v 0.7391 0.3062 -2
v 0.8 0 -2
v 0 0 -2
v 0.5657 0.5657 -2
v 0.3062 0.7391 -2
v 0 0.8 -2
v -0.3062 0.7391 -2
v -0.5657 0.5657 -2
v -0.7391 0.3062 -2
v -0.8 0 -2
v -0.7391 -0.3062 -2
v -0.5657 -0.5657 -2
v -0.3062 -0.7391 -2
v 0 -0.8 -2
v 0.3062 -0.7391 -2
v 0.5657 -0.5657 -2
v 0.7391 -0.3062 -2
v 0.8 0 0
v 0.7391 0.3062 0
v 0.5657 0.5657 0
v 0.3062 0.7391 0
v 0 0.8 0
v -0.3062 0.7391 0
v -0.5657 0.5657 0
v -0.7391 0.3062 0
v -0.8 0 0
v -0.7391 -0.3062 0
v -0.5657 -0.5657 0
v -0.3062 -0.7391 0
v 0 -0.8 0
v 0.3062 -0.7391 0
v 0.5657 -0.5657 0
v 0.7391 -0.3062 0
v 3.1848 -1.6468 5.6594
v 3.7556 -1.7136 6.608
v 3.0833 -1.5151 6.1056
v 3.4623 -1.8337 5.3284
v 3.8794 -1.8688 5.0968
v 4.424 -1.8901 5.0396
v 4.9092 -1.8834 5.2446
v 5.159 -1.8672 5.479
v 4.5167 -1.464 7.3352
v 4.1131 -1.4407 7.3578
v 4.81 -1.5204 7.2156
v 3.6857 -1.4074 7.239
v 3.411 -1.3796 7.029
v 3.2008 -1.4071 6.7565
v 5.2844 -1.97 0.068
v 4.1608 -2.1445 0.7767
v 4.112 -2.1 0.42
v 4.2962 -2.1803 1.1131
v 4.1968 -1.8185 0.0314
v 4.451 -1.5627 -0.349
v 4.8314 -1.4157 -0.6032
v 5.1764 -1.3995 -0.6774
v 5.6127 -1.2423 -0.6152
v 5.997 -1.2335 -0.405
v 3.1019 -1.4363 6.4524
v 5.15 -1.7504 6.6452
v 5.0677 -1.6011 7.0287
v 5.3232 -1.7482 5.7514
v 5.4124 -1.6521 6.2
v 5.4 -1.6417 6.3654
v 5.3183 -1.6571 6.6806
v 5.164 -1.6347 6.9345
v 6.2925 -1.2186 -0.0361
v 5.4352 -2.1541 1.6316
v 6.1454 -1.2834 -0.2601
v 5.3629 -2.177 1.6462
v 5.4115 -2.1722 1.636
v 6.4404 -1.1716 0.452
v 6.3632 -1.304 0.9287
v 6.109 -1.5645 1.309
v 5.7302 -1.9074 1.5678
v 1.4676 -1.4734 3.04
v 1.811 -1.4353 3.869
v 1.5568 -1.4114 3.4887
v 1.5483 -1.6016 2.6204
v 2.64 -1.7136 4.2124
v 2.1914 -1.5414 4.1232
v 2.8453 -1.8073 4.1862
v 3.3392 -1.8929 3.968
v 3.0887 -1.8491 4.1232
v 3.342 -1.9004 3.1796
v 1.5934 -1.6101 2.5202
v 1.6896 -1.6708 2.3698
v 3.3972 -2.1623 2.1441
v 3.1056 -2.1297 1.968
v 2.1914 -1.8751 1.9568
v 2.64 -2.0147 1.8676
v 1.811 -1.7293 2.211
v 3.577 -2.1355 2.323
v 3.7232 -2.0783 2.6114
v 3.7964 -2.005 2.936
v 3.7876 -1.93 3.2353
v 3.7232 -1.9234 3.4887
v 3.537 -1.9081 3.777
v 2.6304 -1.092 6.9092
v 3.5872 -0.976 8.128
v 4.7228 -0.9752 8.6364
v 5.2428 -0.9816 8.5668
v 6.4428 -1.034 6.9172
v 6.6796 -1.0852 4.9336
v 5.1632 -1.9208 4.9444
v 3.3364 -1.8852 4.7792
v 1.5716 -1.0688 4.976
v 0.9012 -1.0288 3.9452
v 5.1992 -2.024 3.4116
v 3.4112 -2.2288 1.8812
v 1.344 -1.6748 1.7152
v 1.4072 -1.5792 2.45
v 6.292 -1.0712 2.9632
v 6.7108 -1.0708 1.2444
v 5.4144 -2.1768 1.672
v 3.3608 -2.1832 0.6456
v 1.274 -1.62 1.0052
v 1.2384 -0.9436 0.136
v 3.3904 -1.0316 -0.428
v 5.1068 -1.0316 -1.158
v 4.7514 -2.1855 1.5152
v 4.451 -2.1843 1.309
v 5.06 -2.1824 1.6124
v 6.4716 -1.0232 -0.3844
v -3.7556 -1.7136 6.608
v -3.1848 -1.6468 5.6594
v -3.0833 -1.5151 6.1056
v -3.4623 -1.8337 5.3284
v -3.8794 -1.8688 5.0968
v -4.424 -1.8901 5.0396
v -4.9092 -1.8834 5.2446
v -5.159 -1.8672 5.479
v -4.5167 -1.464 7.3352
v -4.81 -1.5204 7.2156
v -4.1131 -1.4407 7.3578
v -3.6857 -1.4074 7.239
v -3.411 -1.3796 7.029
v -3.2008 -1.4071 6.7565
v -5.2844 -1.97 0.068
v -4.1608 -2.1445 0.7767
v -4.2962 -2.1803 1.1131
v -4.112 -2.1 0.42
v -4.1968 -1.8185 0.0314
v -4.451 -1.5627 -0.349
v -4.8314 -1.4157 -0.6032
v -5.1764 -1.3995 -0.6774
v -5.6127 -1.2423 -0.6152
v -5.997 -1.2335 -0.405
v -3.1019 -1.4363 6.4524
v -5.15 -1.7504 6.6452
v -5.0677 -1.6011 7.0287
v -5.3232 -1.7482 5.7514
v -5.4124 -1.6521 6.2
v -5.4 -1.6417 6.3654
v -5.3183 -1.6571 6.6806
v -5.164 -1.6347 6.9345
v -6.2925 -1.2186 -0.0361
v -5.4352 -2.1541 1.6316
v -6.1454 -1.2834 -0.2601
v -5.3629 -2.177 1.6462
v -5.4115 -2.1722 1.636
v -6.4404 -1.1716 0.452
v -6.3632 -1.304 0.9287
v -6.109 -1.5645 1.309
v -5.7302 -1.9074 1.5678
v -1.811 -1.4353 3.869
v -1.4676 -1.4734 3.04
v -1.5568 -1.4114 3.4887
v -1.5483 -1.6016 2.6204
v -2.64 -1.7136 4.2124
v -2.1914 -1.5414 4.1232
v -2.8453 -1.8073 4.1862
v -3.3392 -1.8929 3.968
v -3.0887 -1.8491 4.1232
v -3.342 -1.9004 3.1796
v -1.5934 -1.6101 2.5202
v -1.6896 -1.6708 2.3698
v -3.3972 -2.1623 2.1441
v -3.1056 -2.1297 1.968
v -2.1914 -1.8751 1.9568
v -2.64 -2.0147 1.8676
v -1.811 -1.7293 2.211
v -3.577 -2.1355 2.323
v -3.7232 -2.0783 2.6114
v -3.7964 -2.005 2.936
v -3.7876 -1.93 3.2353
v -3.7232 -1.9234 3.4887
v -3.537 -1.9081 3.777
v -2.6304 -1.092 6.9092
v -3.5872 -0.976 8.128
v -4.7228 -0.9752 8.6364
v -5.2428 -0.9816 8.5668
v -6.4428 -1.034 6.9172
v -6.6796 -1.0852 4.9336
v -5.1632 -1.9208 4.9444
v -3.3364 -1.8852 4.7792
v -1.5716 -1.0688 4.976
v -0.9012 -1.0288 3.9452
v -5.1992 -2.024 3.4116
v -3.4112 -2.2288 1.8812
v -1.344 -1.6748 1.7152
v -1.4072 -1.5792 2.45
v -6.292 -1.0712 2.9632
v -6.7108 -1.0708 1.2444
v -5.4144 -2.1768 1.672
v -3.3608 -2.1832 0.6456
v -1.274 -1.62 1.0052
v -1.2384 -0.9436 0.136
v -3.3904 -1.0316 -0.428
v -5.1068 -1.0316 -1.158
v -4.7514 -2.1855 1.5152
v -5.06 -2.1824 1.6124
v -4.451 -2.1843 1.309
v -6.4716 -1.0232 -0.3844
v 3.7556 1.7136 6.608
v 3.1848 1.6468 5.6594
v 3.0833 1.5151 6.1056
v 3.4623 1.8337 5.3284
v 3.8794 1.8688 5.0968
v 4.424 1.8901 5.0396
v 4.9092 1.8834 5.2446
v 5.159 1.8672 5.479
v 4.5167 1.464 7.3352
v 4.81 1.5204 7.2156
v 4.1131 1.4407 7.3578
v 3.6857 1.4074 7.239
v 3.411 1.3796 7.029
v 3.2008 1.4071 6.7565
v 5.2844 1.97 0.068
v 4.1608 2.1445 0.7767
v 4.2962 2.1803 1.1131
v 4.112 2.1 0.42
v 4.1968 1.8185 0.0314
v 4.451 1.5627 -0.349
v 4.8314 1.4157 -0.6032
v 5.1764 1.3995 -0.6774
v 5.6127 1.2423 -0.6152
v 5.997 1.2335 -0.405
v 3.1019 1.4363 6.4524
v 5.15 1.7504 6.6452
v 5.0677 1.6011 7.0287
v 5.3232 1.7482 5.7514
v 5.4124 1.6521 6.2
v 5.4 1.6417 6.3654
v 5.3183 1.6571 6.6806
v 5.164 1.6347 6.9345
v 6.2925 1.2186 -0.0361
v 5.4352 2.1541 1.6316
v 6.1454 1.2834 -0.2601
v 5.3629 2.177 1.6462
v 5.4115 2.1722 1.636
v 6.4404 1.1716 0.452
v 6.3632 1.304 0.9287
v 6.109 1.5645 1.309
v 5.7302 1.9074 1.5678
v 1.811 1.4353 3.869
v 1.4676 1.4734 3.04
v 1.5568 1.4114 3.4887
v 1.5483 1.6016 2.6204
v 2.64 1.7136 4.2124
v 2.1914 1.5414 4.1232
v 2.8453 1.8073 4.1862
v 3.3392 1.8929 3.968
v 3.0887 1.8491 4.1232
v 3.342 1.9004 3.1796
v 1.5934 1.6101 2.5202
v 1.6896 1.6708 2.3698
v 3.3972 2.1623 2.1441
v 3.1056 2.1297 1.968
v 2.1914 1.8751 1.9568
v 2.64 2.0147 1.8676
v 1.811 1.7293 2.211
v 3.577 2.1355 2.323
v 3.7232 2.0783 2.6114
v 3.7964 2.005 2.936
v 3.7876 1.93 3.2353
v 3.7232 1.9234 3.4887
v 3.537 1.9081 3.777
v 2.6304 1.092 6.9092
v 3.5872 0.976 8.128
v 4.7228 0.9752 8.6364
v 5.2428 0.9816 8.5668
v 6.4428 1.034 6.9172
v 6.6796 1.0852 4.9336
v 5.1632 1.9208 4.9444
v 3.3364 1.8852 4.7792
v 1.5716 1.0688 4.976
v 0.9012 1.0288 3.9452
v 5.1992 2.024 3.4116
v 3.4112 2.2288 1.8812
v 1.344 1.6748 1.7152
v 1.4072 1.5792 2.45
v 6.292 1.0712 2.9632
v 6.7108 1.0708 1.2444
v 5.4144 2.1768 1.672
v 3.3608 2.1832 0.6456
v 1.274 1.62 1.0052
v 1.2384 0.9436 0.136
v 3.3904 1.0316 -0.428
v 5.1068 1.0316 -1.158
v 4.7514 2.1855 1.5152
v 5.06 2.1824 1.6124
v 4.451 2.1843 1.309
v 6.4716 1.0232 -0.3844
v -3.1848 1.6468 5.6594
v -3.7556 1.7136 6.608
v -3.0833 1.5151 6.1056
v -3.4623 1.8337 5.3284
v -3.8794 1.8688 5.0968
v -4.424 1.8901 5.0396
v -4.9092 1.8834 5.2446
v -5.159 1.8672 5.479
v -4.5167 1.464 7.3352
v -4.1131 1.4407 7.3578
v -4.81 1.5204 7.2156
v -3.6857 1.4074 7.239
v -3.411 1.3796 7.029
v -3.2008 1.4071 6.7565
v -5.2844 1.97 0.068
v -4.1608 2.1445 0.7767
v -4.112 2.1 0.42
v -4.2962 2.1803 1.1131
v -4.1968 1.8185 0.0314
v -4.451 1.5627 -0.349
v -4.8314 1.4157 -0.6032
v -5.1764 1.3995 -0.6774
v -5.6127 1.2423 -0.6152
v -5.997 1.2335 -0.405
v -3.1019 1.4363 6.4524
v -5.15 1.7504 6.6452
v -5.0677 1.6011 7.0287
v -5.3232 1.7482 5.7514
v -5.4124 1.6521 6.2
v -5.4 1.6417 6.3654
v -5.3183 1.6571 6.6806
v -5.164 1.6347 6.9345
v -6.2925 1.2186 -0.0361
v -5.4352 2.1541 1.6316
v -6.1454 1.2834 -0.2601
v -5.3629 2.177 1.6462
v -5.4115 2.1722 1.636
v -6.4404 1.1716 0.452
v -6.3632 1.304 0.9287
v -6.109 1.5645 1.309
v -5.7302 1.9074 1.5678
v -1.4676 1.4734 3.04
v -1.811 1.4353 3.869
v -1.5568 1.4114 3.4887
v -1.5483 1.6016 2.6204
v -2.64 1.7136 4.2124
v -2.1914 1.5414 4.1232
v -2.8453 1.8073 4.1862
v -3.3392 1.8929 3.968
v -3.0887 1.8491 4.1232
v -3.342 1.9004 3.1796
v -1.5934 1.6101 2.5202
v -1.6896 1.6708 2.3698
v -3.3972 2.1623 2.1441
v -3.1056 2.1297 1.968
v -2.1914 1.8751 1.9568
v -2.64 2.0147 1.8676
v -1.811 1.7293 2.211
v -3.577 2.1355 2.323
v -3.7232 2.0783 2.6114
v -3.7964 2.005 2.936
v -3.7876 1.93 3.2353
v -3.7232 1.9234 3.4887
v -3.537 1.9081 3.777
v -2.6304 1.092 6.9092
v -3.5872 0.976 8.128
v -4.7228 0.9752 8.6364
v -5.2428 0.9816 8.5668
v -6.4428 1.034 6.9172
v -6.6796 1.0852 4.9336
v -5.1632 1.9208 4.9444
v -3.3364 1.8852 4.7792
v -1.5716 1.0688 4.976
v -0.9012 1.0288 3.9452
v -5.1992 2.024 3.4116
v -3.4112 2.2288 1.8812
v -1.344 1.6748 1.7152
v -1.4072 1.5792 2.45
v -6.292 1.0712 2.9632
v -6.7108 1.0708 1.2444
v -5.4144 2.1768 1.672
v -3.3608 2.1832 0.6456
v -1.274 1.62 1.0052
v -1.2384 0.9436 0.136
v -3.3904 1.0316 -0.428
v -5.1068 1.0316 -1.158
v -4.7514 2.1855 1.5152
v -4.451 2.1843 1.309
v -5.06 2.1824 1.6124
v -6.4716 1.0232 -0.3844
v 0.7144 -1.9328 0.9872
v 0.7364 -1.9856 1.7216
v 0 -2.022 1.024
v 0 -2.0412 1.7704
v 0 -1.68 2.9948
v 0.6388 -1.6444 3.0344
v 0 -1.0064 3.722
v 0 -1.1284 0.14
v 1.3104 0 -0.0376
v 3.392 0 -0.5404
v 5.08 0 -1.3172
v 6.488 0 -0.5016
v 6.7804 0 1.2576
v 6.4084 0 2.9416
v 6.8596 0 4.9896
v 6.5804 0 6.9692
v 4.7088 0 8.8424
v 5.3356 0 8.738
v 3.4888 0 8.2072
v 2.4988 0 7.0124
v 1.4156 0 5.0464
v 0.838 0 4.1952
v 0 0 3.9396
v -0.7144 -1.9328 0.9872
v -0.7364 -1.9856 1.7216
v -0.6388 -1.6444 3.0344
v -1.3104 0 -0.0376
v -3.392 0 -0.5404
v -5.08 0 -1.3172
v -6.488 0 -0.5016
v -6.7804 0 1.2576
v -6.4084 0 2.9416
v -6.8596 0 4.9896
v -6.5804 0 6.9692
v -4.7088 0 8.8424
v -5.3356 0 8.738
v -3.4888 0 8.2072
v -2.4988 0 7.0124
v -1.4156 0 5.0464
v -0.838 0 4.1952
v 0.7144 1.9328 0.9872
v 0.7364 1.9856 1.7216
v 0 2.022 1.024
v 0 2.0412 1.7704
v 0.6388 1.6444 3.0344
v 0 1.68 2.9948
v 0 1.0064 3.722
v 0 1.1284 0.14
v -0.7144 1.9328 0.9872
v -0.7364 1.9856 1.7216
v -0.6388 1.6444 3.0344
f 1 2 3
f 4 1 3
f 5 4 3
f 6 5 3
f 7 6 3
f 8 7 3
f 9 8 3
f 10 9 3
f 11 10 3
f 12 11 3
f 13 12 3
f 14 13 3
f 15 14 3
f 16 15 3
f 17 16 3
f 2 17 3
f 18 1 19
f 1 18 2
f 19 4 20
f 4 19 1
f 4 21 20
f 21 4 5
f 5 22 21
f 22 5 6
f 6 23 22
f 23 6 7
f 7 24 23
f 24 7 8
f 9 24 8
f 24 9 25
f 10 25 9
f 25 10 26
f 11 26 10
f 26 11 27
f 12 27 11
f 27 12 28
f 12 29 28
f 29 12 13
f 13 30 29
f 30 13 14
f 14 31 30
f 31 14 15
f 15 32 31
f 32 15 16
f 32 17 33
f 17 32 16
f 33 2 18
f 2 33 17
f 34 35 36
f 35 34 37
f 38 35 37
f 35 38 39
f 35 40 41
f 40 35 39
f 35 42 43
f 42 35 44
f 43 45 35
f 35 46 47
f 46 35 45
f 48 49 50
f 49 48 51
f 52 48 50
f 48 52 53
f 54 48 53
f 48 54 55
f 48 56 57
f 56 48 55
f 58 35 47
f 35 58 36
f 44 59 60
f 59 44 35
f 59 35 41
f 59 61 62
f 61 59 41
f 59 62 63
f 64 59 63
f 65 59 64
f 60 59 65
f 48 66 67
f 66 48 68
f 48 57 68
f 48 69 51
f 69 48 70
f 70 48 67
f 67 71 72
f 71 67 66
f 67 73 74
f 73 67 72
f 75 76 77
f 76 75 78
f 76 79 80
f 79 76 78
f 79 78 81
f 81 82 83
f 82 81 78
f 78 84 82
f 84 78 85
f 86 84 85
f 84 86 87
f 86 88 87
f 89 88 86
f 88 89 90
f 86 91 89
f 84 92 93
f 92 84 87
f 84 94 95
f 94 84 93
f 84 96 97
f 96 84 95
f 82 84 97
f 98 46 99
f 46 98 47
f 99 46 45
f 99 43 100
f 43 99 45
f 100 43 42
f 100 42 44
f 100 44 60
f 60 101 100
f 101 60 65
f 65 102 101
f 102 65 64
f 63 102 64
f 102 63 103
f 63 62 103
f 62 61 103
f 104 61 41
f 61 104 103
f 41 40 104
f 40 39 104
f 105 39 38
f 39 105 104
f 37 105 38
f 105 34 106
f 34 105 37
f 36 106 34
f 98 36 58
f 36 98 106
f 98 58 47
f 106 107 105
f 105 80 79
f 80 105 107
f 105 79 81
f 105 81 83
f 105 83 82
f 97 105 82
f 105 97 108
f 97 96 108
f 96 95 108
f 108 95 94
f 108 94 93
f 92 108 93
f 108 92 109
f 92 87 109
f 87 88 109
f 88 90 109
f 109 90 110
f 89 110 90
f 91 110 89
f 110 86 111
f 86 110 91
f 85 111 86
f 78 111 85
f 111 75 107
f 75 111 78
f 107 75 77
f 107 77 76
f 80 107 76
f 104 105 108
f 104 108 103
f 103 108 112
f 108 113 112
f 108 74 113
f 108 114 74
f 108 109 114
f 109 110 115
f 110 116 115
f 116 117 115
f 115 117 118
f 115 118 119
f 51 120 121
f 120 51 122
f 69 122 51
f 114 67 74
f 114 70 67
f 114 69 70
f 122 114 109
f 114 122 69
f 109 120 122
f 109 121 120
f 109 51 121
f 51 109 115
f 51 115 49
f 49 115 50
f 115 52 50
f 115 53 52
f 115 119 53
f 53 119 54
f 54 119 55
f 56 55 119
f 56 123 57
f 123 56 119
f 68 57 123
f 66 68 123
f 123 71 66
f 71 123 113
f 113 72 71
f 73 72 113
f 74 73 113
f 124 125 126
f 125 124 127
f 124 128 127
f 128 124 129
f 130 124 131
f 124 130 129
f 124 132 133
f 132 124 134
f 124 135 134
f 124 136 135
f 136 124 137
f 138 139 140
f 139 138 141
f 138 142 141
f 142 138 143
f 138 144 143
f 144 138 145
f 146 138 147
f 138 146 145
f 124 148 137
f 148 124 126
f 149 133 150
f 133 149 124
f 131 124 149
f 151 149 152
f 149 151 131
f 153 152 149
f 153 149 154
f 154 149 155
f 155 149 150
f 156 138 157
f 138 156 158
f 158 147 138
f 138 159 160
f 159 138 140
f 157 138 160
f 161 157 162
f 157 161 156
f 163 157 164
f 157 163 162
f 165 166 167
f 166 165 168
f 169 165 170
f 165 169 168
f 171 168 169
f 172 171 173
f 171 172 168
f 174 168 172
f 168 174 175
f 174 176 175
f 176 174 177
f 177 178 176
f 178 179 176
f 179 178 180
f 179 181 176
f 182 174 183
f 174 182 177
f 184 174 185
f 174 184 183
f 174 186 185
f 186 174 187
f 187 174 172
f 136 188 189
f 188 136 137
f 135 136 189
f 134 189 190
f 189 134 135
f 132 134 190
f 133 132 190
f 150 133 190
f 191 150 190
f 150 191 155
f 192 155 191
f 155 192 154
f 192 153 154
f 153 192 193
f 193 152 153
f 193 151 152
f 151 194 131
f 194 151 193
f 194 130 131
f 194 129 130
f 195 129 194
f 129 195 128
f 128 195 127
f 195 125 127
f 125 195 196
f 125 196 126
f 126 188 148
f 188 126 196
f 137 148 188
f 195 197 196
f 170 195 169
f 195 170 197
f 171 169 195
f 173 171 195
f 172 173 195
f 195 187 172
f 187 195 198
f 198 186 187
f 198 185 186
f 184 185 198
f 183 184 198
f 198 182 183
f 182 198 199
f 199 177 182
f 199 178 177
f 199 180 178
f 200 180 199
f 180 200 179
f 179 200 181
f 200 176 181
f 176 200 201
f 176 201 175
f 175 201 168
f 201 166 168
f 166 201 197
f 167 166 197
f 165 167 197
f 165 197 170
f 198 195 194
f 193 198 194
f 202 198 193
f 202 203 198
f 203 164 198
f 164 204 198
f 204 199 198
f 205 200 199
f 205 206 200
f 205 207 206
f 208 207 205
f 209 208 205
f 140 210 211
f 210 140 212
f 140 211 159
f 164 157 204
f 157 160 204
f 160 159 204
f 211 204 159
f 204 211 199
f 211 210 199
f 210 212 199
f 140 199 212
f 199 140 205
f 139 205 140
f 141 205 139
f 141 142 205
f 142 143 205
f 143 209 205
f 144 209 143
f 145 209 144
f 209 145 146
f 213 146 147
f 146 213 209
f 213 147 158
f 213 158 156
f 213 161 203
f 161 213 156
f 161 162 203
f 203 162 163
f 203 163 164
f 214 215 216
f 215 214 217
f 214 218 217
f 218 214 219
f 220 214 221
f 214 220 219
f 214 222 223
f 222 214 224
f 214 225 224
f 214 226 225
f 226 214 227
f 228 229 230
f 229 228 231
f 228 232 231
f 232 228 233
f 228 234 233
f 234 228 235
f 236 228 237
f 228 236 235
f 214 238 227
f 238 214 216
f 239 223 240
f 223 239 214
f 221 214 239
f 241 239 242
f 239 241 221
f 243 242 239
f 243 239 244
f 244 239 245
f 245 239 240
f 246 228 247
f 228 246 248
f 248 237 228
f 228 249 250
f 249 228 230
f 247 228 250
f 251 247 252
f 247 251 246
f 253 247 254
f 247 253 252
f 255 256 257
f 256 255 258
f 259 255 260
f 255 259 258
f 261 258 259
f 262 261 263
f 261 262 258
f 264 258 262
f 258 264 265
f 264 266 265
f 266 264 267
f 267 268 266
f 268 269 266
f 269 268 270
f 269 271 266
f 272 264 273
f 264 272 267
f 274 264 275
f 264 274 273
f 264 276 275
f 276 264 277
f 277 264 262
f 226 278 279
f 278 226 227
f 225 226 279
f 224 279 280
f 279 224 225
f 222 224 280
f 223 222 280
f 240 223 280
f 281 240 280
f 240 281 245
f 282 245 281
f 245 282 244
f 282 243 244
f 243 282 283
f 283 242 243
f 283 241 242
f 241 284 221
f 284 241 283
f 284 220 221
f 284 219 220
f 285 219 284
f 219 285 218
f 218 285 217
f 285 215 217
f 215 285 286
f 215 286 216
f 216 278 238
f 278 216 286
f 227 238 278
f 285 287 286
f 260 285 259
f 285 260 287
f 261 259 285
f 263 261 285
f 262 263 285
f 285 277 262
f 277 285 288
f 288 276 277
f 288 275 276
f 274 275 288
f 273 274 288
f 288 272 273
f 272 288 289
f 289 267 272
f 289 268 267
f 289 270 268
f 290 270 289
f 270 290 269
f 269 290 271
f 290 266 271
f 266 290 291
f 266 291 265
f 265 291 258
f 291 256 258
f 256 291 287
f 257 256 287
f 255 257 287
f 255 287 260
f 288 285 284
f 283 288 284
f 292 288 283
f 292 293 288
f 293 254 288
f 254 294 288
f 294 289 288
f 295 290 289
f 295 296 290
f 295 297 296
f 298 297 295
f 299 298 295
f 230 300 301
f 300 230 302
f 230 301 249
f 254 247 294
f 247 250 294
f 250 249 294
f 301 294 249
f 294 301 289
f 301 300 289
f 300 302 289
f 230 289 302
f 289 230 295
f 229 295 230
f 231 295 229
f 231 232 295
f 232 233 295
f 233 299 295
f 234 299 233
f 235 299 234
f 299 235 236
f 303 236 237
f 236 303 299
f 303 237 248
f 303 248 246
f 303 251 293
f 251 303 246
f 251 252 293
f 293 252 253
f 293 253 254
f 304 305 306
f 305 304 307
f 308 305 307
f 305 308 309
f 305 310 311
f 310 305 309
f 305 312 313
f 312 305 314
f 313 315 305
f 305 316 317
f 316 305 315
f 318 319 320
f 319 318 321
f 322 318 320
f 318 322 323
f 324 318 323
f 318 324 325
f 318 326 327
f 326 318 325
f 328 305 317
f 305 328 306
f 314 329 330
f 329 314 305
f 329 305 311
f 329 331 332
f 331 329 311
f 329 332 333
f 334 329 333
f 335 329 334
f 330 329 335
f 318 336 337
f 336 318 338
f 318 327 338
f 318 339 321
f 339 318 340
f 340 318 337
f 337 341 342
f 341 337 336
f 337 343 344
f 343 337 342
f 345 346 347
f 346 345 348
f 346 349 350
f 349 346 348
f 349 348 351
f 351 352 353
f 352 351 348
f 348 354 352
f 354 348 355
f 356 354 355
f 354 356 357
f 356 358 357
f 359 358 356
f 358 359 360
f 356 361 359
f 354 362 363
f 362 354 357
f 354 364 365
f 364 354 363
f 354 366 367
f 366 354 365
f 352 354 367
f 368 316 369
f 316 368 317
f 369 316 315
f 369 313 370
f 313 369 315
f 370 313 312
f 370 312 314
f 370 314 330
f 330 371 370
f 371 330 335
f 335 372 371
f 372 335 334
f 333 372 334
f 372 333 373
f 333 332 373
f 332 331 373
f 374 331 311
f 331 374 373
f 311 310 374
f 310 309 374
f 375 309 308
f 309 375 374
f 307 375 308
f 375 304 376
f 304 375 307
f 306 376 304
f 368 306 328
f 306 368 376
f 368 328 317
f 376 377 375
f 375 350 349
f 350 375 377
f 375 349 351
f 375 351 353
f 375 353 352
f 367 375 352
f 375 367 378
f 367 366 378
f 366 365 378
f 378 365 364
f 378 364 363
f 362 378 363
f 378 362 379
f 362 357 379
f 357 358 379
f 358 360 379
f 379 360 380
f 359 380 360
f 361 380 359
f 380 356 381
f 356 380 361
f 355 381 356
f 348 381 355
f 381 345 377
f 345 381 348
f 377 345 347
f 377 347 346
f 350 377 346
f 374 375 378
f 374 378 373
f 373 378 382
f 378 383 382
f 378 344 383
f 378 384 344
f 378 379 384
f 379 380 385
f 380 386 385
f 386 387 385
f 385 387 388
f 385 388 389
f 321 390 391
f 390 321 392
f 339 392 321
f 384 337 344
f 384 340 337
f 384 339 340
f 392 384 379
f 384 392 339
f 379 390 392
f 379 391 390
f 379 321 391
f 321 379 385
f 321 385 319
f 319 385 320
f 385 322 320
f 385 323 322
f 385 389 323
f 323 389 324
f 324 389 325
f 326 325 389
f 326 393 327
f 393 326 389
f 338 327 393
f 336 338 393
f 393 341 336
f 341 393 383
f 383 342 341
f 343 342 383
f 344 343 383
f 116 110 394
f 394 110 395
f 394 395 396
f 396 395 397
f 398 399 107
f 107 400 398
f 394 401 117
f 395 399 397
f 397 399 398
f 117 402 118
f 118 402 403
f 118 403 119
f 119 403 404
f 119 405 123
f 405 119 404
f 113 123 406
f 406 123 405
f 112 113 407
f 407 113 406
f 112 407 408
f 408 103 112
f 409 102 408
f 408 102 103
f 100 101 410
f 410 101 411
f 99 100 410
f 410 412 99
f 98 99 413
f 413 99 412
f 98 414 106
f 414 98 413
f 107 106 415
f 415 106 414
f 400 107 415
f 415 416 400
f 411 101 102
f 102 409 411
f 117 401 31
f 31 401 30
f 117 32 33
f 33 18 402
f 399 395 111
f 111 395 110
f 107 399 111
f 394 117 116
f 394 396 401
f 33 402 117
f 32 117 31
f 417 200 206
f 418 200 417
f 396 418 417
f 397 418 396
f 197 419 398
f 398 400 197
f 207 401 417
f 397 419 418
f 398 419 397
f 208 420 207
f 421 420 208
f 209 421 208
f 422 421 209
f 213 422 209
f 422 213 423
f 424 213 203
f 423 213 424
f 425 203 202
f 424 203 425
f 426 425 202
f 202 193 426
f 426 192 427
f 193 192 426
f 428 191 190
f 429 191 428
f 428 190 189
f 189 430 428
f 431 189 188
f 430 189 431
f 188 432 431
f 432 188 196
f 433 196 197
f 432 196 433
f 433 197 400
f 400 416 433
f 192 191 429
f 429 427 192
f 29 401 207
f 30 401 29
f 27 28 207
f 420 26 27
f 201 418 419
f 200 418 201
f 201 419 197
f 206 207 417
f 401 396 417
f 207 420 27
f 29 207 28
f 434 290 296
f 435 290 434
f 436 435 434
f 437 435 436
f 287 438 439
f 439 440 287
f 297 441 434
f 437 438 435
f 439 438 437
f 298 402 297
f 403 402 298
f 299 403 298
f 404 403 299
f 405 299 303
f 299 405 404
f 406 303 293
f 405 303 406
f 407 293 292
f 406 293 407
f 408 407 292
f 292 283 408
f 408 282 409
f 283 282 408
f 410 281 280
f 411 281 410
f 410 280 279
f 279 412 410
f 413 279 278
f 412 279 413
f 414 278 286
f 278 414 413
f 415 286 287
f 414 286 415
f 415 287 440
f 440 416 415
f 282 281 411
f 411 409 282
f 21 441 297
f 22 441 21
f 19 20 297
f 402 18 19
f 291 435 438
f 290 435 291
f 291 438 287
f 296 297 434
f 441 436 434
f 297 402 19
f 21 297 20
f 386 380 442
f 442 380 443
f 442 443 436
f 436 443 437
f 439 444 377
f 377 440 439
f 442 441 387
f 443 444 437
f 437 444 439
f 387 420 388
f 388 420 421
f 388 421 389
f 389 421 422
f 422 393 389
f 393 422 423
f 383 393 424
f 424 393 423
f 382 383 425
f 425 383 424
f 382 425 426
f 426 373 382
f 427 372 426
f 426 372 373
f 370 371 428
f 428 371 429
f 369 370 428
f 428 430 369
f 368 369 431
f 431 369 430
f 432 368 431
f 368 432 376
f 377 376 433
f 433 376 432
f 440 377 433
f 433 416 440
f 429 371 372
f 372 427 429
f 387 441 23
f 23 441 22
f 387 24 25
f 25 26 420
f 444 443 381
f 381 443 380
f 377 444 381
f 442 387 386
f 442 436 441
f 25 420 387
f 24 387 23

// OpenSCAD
// file: ../p/4-4edge.scad
use <../lib.scad>
function ldraw_lib__4_4edge() = [
// 0 Circle 1.0
// 0 Name: 4-4edge.dat
// 0 Author: James Jessiman
// 0 !LDRAW_ORG Primitive UPDATE 2017-01
// 0 !LICENSE Licensed under CC BY 4.0 : see CAreadme.txt
// 
// 0 BFC CERTIFY CCW
  [0,"BFC","CERTIFY"],
  [0,"BFC","CCW"],
// 
// 0 !HISTORY 1998-12-15 [PTadmin] Official Update 1998-10
// 0 !HISTORY 2005-12-28 [PTadmin] Official Update 2005-01
// 0 !HISTORY 2007-06-24 [PTadmin] Header formatted for Contributor Agreement
// 0 !HISTORY 2008-07-01 [PTadmin] Official Update 2008-01
// 0 !HISTORY 2017-01-15 [Steffen] BFCed
// 0 !HISTORY 2017-12-30 [PTadmin] Official Update 2017-01
// 
// 
// 2 24 1 0 0 0.9239 0 0.3827
  [2,24,1,0,0,0.9239,0,0.3827],
// 2 24 0.9239 0 0.3827 0.7071 0 0.7071
  [2,24,0.9239,0,0.3827,0.7071,0,0.7071],
// 2 24 0.7071 0 0.7071 0.3827 0 0.9239
  [2,24,0.7071,0,0.7071,0.3827,0,0.9239],
// 2 24 0.3827 0 0.9239 0 0 1
  [2,24,0.3827,0,0.9239,0,0,1],
// 2 24 0 0 1 -0.3827 0 0.9239
  [2,24,0,0,1,-0.3827,0,0.9239],
// 2 24 -0.3827 0 0.9239 -0.7071 0 0.7071
  [2,24,-0.3827,0,0.9239,-0.7071,0,0.7071],
// 2 24 -0.7071 0 0.7071 -0.9239 0 0.3827
  [2,24,-0.7071,0,0.7071,-0.9239,0,0.3827],
// 2 24 -0.9239 0 0.3827 -1 0 -0
  [2,24,-0.9239,0,0.3827,-1,0,-0],
// 2 24 -1 0 -0 -0.9239 0 -0.3827
  [2,24,-1,0,-0,-0.9239,0,-0.3827],
// 2 24 -0.9239 0 -0.3827 -0.7071 0 -0.7071
  [2,24,-0.9239,0,-0.3827,-0.7071,0,-0.7071],
// 2 24 -0.7071 0 -0.7071 -0.3827 0 -0.9239
  [2,24,-0.7071,0,-0.7071,-0.3827,0,-0.9239],
// 2 24 -0.3827 0 -0.9239 0 0 -1
  [2,24,-0.3827,0,-0.9239,0,0,-1],
// 2 24 0 0 -1 0.3827 0 -0.9239
  [2,24,0,0,-1,0.3827,0,-0.9239],
// 2 24 0.3827 0 -0.9239 0.7071 0 -0.7071
  [2,24,0.3827,0,-0.9239,0.7071,0,-0.7071],
// 2 24 0.7071 0 -0.7071 0.9239 0 -0.3827
  [2,24,0.7071,0,-0.7071,0.9239,0,-0.3827],
// 2 24 0.9239 0 -0.3827 1 0 0
  [2,24,0.9239,0,-0.3827,1,0,0],
];
module ldraw_lib__4_4edge(step=0, col=false, unit=2/5, alt=false, line=0.2, solid=!$preview)
    makepoly(ldraw_lib__4_4edge(), step=step, col=col, unit=unit, alt=alt, line=line, solid=solid);
ldraw_lib__4_4edge(line=0.2);
// file: ../p/4-4disc.scad
use <../lib.scad>
function ldraw_lib__4_4disc() = [
// 0 Disc 1.0
// 0 Name: 4-4disc.dat
// 0 Author: James Jessiman
// 0 !LDRAW_ORG Primitive UPDATE 2002-02
// 0 !LICENSE Licensed under CC BY 4.0 : see CAreadme.txt
// 
// 0 BFC CERTIFY CCW
  [0,"BFC","CERTIFY"],
  [0,"BFC","CCW"],
// 
// 0 !HISTORY 1998-12-15 [PTadmin] Official Update 1998-10
// 0 !HISTORY 2002-03-23 [sbliss] Added BFC statement
// 0 !HISTORY 2002-04-25 [PTadmin] Official Update 2002-02
// 0 !HISTORY 2007-06-24 [PTadmin] Header formatted for Contributor Agreement
// 0 !HISTORY 2008-07-01 [PTadmin] Official Update 2008-01
// 
// 
// 3 16 0 0 0 1 0 0 0.9239 0 0.3827
  [3,16,0,0,0,1,0,0,0.9239,0,0.3827],
// 3 16 0 0 0 0.9239 0 0.3827 0.7071 0 0.7071
  [3,16,0,0,0,0.9239,0,0.3827,0.7071,0,0.7071],
// 3 16 0 0 0 0.7071 0 0.7071 0.3827 0 0.9239
  [3,16,0,0,0,0.7071,0,0.7071,0.3827,0,0.9239],
// 3 16 0 0 0 0.3827 0 0.9239 0 0 1
  [3,16,0,0,0,0.3827,0,0.9239,0,0,1],
// 3 16 0 0 0 0 0 1 -0.3827 0 0.9239
  [3,16,0,0,0,0,0,1,-0.3827,0,0.9239],
// 3 16 0 0 0 -0.3827 0 0.9239 -0.7071 0 0.7071
  [3,16,0,0,0,-0.3827,0,0.9239,-0.7071,0,0.7071],
// 3 16 0 0 0 -0.7071 0 0.7071 -0.9239 0 0.3827
  [3,16,0,0,0,-0.7071,0,0.7071,-0.9239,0,0.3827],
// 3 16 0 0 0 -0.9239 0 0.3827 -1 0 -0
  [3,16,0,0,0,-0.9239,0,0.3827,-1,0,-0],
// 3 16 0 0 0 -1 0 -0 -0.9239 0 -0.3827
  [3,16,0,0,0,-1,0,-0,-0.9239,0,-0.3827],
// 3 16 0 0 0 -0.9239 0 -0.3827 -0.7071 0 -0.7071
  [3,16,0,0,0,-0.9239,0,-0.3827,-0.7071,0,-0.7071],
// 3 16 0 0 0 -0.7071 0 -0.7071 -0.3827 0 -0.9239
  [3,16,0,0,0,-0.7071,0,-0.7071,-0.3827,0,-0.9239],
// 3 16 0 0 0 -0.3827 0 -0.9239 0 0 -1
  [3,16,0,0,0,-0.3827,0,-0.9239,0,0,-1],
// 3 16 0 0 0 0 0 -1 0.3827 0 -0.9239
  [3,16,0,0,0,0,0,-1,0.3827,0,-0.9239],
// 3 16 0 0 0 0.3827 0 -0.9239 0.7071 0 -0.7071
  [3,16,0,0,0,0.3827,0,-0.9239,0.7071,0,-0.7071],
// 3 16 0 0 0 0.7071 0 -0.7071 0.9239 0 -0.3827
  [3,16,0,0,0,0.7071,0,-0.7071,0.9239,0,-0.3827],
// 3 16 0 0 0 0.9239 0 -0.3827 1 0 0
  [3,16,0,0,0,0.9239,0,-0.3827,1,0,0],
// 0
];
module ldraw_lib__4_4disc(step=0, col=false, unit=2/5, alt=false, line=0.2, solid=!$preview)
    makepoly(ldraw_lib__4_4disc(), step=step, col=col, unit=unit, alt=alt, line=line, solid=solid);
ldraw_lib__4_4disc(line=0.2);
// file: ../p/4-4cyli.scad
use <../lib.scad>
function ldraw_lib__4_4cyli() = [
// 0 Cylinder 1.0
// 0 Name: 4-4cyli.dat
// 0 Author: James Jessiman
// 0 !LDRAW_ORG Primitive UPDATE 2005-01
// 0 !LICENSE Licensed under CC BY 4.0 : see CAreadme.txt
// 
// 0 BFC CERTIFY CCW
  [0,"BFC","CERTIFY"],
  [0,"BFC","CCW"],
// 
// 0 !HISTORY 1998-12-15 [PTadmin] Official Update 1998-10
// 0 !HISTORY 2002-03-23 [sbliss] Added BFC statement; merged headers from files in distributions LDraw 0.27 and Complete.
// 0 !HISTORY 2002-04-25 [PTadmin] Official Update 2002-02
// 0 !HISTORY 2004-12-14 [guyvivan] BFC CCW
// 0 !HISTORY 2005-12-28 [PTadmin] Official Update 2005-01
// 0 !HISTORY 2007-06-24 [PTadmin] Header formatted for Contributor Agreement
// 0 !HISTORY 2008-07-01 [PTadmin] Official Update 2008-01
// 
// 
// 4 16 1 1 0 0.9239 1 0.3827 0.9239 0 0.3827 1 0 0
  [4,16,1,1,0,0.9239,1,0.3827,0.9239,0,0.3827,1,0,0],
// 5 24 1 0 0 1 1 0 0.9239 0 0.3827 0.9239 0 -0.3827
  [5,24,1,0,0,1,1,0,0.9239,0,0.3827,0.9239,0,-0.3827],
// 4 16 0.9239 1 0.3827 0.7071 1 0.7071 0.7071 0 0.7071 0.9239 0 0.3827
  [4,16,0.9239,1,0.3827,0.7071,1,0.7071,0.7071,0,0.7071,0.9239,0,0.3827],
// 5 24 0.9239 0 0.3827 0.9239 1 0.3827 0.7071 0 0.7071 1 0 0
  [5,24,0.9239,0,0.3827,0.9239,1,0.3827,0.7071,0,0.7071,1,0,0],
// 4 16 0.7071 1 0.7071 0.3827 1 0.9239 0.3827 0 0.9239 0.7071 0 0.7071
  [4,16,0.7071,1,0.7071,0.3827,1,0.9239,0.3827,0,0.9239,0.7071,0,0.7071],
// 5 24 0.7071 0 0.7071 0.7071 1 0.7071 0.3827 0 0.9239 0.9239 0 0.3827
  [5,24,0.7071,0,0.7071,0.7071,1,0.7071,0.3827,0,0.9239,0.9239,0,0.3827],
// 4 16 0.3827 1 0.9239 0 1 1 0 0 1 0.3827 0 0.9239
  [4,16,0.3827,1,0.9239,0,1,1,0,0,1,0.3827,0,0.9239],
// 5 24 0.3827 0 0.9239 0.3827 1 0.9239 0 0 1 0.7071 0 0.7071
  [5,24,0.3827,0,0.9239,0.3827,1,0.9239,0,0,1,0.7071,0,0.7071],
// 4 16 0 1 1 -0.3827 1 0.9239 -0.3827 0 0.9239 0 0 1
  [4,16,0,1,1,-0.3827,1,0.9239,-0.3827,0,0.9239,0,0,1],
// 5 24 0 0 1 0 1 1 -0.3827 0 0.9239 0.3827 0 0.9239
  [5,24,0,0,1,0,1,1,-0.3827,0,0.9239,0.3827,0,0.9239],
// 4 16 -0.3827 1 0.9239 -0.7071 1 0.7071 -0.7071 0 0.7071 -0.3827 0 0.9239
  [4,16,-0.3827,1,0.9239,-0.7071,1,0.7071,-0.7071,0,0.7071,-0.3827,0,0.9239],
// 5 24 -0.3827 0 0.9239 -0.3827 1 0.9239 -0.7071 0 0.7071 0 0 1
  [5,24,-0.3827,0,0.9239,-0.3827,1,0.9239,-0.7071,0,0.7071,0,0,1],
// 4 16 -0.7071 1 0.7071 -0.9239 1 0.3827 -0.9239 0 0.3827 -0.7071 0 0.7071
  [4,16,-0.7071,1,0.7071,-0.9239,1,0.3827,-0.9239,0,0.3827,-0.7071,0,0.7071],
// 5 24 -0.7071 0 0.7071 -0.7071 1 0.7071 -0.9239 0 0.3827 -0.3827 0 0.9239
  [5,24,-0.7071,0,0.7071,-0.7071,1,0.7071,-0.9239,0,0.3827,-0.3827,0,0.9239],
// 4 16 -0.9239 1 0.3827 -1 1 0 -1 0 0 -0.9239 0 0.3827
  [4,16,-0.9239,1,0.3827,-1,1,0,-1,0,0,-0.9239,0,0.3827],
// 5 24 -0.9239 0 0.3827 -0.9239 1 0.3827 -1 0 0 -0.7071 0 0.7071
  [5,24,-0.9239,0,0.3827,-0.9239,1,0.3827,-1,0,0,-0.7071,0,0.7071],
// 4 16 -1 1 0 -0.9239 1 -0.3827 -0.9239 0 -0.3827 -1 0 0
  [4,16,-1,1,0,-0.9239,1,-0.3827,-0.9239,0,-0.3827,-1,0,0],
// 5 24 -1 0 0 -1 1 0 -0.9239 0 -0.3827 -0.9239 0 0.3827
  [5,24,-1,0,0,-1,1,0,-0.9239,0,-0.3827,-0.9239,0,0.3827],
// 4 16 -0.9239 1 -0.3827 -0.7071 1 -0.7071 -0.7071 0 -0.7071 -0.9239 0 -0.3827
  [4,16,-0.9239,1,-0.3827,-0.7071,1,-0.7071,-0.7071,0,-0.7071,-0.9239,0,-0.3827],
// 5 24 -0.9239 0 -0.3827 -0.9239 1 -0.3827 -0.7071 0 -0.7071 -1 0 0
  [5,24,-0.9239,0,-0.3827,-0.9239,1,-0.3827,-0.7071,0,-0.7071,-1,0,0],
// 4 16 -0.7071 1 -0.7071 -0.3827 1 -0.9239 -0.3827 0 -0.9239 -0.7071 0 -0.7071
  [4,16,-0.7071,1,-0.7071,-0.3827,1,-0.9239,-0.3827,0,-0.9239,-0.7071,0,-0.7071],
// 5 24 -0.7071 0 -0.7071 -0.7071 1 -0.7071 -0.3827 0 -0.9239 -0.9239 0 -0.3827
  [5,24,-0.7071,0,-0.7071,-0.7071,1,-0.7071,-0.3827,0,-0.9239,-0.9239,0,-0.3827],
// 4 16 -0.3827 1 -0.9239 0 1 -1 0 0 -1 -0.3827 0 -0.9239
  [4,16,-0.3827,1,-0.9239,0,1,-1,0,0,-1,-0.3827,0,-0.9239],
// 5 24 -0.3827 0 -0.9239 -0.3827 1 -0.9239 0 0 -1 -0.7071 0 -0.7071
  [5,24,-0.3827,0,-0.9239,-0.3827,1,-0.9239,0,0,-1,-0.7071,0,-0.7071],
// 4 16 0 1 -1 0.3827 1 -0.9239 0.3827 0 -0.9239 0 0 -1
  [4,16,0,1,-1,0.3827,1,-0.9239,0.3827,0,-0.9239,0,0,-1],
// 5 24 0 0 -1 0 1 -1 0.3827 0 -0.9239 -0.3827 0 -0.9239
  [5,24,0,0,-1,0,1,-1,0.3827,0,-0.9239,-0.3827,0,-0.9239],
// 4 16 0.3827 1 -0.9239 0.7071 1 -0.7071 0.7071 0 -0.7071 0.3827 0 -0.9239
  [4,16,0.3827,1,-0.9239,0.7071,1,-0.7071,0.7071,0,-0.7071,0.3827,0,-0.9239],
// 5 24 0.3827 0 -0.9239 0.3827 1 -0.9239 0.7071 0 -0.7071 0 0 -1
  [5,24,0.3827,0,-0.9239,0.3827,1,-0.9239,0.7071,0,-0.7071,0,0,-1],
// 4 16 0.7071 1 -0.7071 0.9239 1 -0.3827 0.9239 0 -0.3827 0.7071 0 -0.7071
  [4,16,0.7071,1,-0.7071,0.9239,1,-0.3827,0.9239,0,-0.3827,0.7071,0,-0.7071],
// 5 24 0.7071 0 -0.7071 0.7071 1 -0.7071 0.9239 0 -0.3827 0.3827 0 -0.9239
  [5,24,0.7071,0,-0.7071,0.7071,1,-0.7071,0.9239,0,-0.3827,0.3827,0,-0.9239],
// 4 16 0.9239 1 -0.3827 1 1 0 1 0 0 0.9239 0 -0.3827
  [4,16,0.9239,1,-0.3827,1,1,0,1,0,0,0.9239,0,-0.3827],
// 5 24 0.9239 0 -0.3827 0.9239 1 -0.3827 1 0 0 0.7071 0 -0.7071
  [5,24,0.9239,0,-0.3827,0.9239,1,-0.3827,1,0,0,0.7071,0,-0.7071],
// 0
];
module ldraw_lib__4_4cyli(step=0, col=false, unit=2/5, alt=false, line=0.2, solid=!$preview)
    makepoly(ldraw_lib__4_4cyli(), step=step, col=col, unit=unit, alt=alt, line=line, solid=solid);
ldraw_lib__4_4cyli(line=0.2);
// file: ../p/4-4cylc.scad
use <../lib.scad>
use <4-4cyli.scad>
use <4-4disc.scad>
use <4-4edge.scad>
function ldraw_lib__4_4cylc() = [
// 0 Cylinder Closed 1.0
// 0 Name: 4-4cylc.dat
// 0 Author: Alex Taylor [anathema]
// 0 !LDRAW_ORG Primitive UPDATE 2009-02
// 0 !LICENSE Licensed under CC BY 4.0 : see CAreadme.txt
// 
// 0 BFC CERTIFY CCW
  [0,"BFC","CERTIFY"],
  [0,"BFC","CCW"],
// 
// 0 !HISTORY 2008-12-29 [cwdee] Removed one disc
// 0 !HISTORY 2009-09-03 [PTadmin] Official Update 2009-02
// 
// 
// 1 16 0 0 0 1 0 0 0 1 0 0 0 1 4-4edge.dat
  [1,16,0,0,0,1,0,0,0,1,0,0,0,1, ldraw_lib__4_4edge()],
// 1 16 0 1 0 1 0 0 0 1 0 0 0 1 4-4edge.dat
  [1,16,0,1,0,1,0,0,0,1,0,0,0,1, ldraw_lib__4_4edge()],
// 1 16 0 0 0 1 0 0 0 1 0 0 0 1 4-4disc.dat
  [1,16,0,0,0,1,0,0,0,1,0,0,0,1, ldraw_lib__4_4disc()],
// 1 16 0 0 0 1 0 0 0 1 0 0 0 1 4-4cyli.dat
  [1,16,0,0,0,1,0,0,0,1,0,0,0,1, ldraw_lib__4_4cyli()],
// 0
];
module ldraw_lib__4_4cylc(step=0, col=false, unit=2/5, alt=false, line=0.2, solid=!$preview)
    makepoly(ldraw_lib__4_4cylc(), step=step, col=col, unit=unit, alt=alt, line=line, solid=solid);
ldraw_lib__4_4cylc(line=0.2);
// main file
use <../lib.scad>
use <../p/4-4cylc.scad>
use <s/24634p01s01.scad>
use <s/24634s02.scad>
function ldraw_lib__24634p01() = [
// 0 Minifig Hair Decoration Bow Large with Pin with  6 White Polka Dots on Each Side Pattern
// 0 Name: 24634p01.dat
// 0 Author: Philippe Hurbain [Philo]
// 0 !LDRAW_ORG Part UPDATE 2024-11
// 0 !LICENSE Licensed under CC BY 4.0 : see CAreadme.txt
// 
// 0 BFC CERTIFY CCW
  [0,"BFC","CERTIFY"],
  [0,"BFC","CCW"],
// 
// 0 !CATEGORY Minifig Accessory
// 0 !KEYWORDS Bricklink 24634pb01, Disney, Minnie, set 71040, Set 71044
// 
// 0 !HISTORY 2024-12-30 [OrionP] Official Update 2024-11
// 
// 
// 1 16 0 5 0 2 0 0 0 -5 0 0 0 2 4-4cylc.dat
  [1,16,0,5,0,2,0,0,0,-5,0,0,0,2, ldraw_lib__4_4cylc()],
// 1 16 0 0 0 1 0 0 0 1 0 0 0 1 s\24634p01s01.dat
  [1,16,0,0,0,1,0,0,0,1,0,0,0,1, ldraw_lib__s__24634p01s01()],
// 1 16 0 0 0 -1 0 0 0 1 0 0 0 1 s\24634p01s01.dat
  [1,16,0,0,0,-1,0,0,0,1,0,0,0,1, ldraw_lib__s__24634p01s01()],
// 1 16 0 0 0 1 0 0 0 1 0 0 0 -1 s\24634p01s01.dat
  [1,16,0,0,0,1,0,0,0,1,0,0,0,-1, ldraw_lib__s__24634p01s01()],
// 1 16 0 0 0 -1 0 0 0 1 0 0 0 -1 s\24634p01s01.dat
  [1,16,0,0,0,-1,0,0,0,1,0,0,0,-1, ldraw_lib__s__24634p01s01()],
// 1 16 0 0 0 1 0 0 0 1 0 0 0 1 s\24634s02.dat
  [1,16,0,0,0,1,0,0,0,1,0,0,0,1, ldraw_lib__s__24634s02()],
// 1 16 0 0 0 -1 0 0 0 1 0 0 0 1 s\24634s02.dat
  [1,16,0,0,0,-1,0,0,0,1,0,0,0,1, ldraw_lib__s__24634s02()],
// 1 16 0 0 0 1 0 0 0 1 0 0 0 -1 s\24634s02.dat
  [1,16,0,0,0,1,0,0,0,1,0,0,0,-1, ldraw_lib__s__24634s02()],
// 1 16 0 0 0 -1 0 0 0 1 0 0 0 -1 s\24634s02.dat
  [1,16,0,0,0,-1,0,0,0,1,0,0,0,-1, ldraw_lib__s__24634s02()],
];
module ldraw_lib__24634p01(step=0, col=false, unit=2/5, alt=false, line=0.2, solid=!$preview)
    makepoly(ldraw_lib__24634p01(), step=step, col=col, unit=unit, alt=alt, line=line, solid=solid);
ldraw_lib__24634p01(line=0.2);
